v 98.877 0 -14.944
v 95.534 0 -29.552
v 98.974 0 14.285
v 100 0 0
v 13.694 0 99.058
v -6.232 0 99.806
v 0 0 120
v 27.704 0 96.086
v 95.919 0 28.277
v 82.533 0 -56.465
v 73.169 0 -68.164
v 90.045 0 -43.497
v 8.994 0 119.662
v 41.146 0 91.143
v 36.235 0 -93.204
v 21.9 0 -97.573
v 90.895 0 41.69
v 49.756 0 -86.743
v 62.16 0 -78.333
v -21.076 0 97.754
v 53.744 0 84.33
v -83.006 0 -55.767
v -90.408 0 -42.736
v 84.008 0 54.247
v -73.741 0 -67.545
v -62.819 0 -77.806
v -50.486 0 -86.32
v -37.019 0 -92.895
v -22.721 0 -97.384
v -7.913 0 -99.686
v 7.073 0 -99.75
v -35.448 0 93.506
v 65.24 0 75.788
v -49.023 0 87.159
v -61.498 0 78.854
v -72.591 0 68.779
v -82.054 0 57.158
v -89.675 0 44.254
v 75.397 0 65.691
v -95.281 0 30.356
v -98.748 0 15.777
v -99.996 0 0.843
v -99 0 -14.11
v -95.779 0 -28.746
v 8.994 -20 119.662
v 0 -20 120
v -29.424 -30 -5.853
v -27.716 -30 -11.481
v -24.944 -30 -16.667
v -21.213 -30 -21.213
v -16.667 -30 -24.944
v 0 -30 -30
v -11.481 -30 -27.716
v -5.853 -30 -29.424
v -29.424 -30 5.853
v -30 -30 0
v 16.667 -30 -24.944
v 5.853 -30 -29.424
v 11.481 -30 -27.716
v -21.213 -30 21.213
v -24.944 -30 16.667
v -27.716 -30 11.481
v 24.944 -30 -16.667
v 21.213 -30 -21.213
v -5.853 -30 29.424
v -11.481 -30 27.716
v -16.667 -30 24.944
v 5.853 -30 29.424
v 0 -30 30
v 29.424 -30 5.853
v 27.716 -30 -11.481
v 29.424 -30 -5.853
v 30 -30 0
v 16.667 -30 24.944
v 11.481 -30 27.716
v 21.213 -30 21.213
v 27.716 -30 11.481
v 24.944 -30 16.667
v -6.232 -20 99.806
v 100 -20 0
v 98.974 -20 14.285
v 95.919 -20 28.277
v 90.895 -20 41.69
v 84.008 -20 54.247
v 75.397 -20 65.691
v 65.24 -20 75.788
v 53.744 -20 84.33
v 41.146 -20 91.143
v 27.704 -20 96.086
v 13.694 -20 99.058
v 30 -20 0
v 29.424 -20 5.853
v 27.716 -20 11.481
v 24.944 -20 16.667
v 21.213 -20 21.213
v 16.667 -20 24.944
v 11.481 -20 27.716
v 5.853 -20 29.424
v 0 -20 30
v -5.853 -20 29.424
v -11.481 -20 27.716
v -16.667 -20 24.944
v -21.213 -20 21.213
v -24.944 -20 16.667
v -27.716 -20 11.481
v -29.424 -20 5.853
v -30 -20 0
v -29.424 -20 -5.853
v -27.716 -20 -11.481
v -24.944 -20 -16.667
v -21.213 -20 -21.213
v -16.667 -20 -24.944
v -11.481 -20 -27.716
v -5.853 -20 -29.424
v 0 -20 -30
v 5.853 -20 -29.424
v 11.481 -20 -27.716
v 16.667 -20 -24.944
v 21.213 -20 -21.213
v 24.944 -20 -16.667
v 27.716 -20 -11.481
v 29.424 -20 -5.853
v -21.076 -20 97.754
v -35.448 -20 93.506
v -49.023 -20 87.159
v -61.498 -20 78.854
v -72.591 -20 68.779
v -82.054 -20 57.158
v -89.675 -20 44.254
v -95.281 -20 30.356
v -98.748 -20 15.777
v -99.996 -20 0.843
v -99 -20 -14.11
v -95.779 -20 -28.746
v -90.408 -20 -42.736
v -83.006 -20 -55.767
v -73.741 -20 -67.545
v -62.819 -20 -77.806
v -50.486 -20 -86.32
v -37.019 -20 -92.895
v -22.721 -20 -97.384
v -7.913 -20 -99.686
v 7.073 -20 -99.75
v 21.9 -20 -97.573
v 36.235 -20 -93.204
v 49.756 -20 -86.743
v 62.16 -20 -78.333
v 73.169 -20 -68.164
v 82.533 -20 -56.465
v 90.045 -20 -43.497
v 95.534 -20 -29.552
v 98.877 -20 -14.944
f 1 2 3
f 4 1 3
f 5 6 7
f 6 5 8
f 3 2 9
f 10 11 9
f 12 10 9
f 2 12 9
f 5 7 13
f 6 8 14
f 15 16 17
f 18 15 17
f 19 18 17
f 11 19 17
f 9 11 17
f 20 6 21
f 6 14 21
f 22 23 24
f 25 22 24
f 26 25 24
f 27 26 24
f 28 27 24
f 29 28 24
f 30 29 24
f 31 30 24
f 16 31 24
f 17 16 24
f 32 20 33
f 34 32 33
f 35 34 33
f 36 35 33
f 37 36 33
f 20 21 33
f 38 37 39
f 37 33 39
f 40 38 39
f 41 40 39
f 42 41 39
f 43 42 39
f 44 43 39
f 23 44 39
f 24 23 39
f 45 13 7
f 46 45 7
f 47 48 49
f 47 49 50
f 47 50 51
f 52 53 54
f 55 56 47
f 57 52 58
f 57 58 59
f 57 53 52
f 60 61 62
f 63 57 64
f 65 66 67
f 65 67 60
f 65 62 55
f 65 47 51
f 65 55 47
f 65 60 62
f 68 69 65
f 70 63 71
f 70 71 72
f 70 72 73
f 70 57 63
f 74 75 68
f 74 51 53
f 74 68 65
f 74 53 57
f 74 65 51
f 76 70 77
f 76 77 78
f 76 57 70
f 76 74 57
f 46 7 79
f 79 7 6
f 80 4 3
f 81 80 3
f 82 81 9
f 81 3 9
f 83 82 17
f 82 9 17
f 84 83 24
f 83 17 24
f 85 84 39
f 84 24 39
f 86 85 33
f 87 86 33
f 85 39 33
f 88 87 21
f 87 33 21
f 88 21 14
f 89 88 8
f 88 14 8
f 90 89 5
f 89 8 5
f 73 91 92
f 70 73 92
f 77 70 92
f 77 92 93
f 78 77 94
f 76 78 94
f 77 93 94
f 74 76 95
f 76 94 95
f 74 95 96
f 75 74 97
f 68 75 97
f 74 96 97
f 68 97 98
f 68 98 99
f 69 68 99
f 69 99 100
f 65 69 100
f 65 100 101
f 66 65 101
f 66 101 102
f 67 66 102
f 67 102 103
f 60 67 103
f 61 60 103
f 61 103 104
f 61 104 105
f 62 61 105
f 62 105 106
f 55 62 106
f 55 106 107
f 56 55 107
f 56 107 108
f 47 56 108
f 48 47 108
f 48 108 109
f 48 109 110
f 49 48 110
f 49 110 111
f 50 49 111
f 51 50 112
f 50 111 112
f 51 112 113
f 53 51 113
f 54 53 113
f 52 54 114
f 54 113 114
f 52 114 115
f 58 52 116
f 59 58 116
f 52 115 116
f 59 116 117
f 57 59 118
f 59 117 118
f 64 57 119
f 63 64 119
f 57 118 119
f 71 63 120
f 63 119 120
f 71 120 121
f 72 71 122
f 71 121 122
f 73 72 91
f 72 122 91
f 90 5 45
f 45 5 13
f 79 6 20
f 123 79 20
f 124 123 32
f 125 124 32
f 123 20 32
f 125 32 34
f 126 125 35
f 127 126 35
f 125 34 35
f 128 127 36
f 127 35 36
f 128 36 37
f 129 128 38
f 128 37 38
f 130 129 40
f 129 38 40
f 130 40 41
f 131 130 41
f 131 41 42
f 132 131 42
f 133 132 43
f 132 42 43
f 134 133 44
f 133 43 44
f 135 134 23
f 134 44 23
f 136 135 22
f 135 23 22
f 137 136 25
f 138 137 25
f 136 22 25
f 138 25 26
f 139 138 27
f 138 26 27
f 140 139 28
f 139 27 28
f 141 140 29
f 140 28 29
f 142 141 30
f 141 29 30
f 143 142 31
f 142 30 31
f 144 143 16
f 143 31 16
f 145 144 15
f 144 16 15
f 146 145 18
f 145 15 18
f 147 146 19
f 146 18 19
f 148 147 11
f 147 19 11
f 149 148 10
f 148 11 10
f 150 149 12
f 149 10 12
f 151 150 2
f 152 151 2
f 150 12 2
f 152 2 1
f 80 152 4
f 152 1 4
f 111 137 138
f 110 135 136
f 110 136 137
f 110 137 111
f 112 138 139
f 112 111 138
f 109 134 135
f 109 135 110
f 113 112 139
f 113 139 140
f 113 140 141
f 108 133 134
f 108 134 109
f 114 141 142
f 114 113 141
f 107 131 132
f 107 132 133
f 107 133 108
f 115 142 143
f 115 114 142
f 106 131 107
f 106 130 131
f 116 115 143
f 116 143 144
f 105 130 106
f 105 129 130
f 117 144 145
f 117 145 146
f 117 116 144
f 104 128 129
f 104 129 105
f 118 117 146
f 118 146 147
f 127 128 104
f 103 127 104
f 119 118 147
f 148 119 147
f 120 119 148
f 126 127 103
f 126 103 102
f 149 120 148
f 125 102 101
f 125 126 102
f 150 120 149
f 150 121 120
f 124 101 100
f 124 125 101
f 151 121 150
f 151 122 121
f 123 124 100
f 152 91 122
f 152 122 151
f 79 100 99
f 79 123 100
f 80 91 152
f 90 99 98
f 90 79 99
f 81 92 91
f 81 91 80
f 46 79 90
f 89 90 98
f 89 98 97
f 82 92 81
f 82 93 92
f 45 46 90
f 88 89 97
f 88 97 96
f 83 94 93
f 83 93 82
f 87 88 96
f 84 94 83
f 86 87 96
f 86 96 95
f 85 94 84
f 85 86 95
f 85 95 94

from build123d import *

# Parameters (mm, degrees)
F0_R     = 30
F1_DEPTH = 30
F2_DEPTH = 20
F3_DEPTH = 20


with BuildPart() as f1:
    # F0 (on Front) → F1 (new body)
    with BuildSketch(Plane.XZ):
        Circle(F0_R)
    extrude(amount=F1_DEPTH)

    # F0 (on Front) → F2 (join)
    with BuildSketch(Plane.XZ):
        with BuildLine():
            ThreePointArc((-6.23154, 99.805651), (-68.47206, -72.880567), (100, 0))
            ThreePointArc((100, 0), (75.397007, 65.690877), (13.694172, 99.057911))
            ThreePointArc((13.694172, 99.057911), (3.75, 99.929663), (-6.23154, 99.805651))
        make_face()
        Circle(F0_R, mode=Mode.SUBTRACT)
    extrude(amount=F2_DEPTH)

    # F0 (on Front) → F3 (join)
    with BuildSketch(Plane.XZ):
        with BuildLine():
            ThreePointArc((-6.23154, 99.805651), (3.75, 99.929663), (13.694172, 99.057911))
            Line((13.694172, 99.057911), (8.99367, 119.6625))
            Line((8.99367, 119.6625), (0, 120))
            Line((0, 120), (-6.23154, 99.805651))
        make_face()
    extrude(amount=F3_DEPTH)


solid = f1.part
